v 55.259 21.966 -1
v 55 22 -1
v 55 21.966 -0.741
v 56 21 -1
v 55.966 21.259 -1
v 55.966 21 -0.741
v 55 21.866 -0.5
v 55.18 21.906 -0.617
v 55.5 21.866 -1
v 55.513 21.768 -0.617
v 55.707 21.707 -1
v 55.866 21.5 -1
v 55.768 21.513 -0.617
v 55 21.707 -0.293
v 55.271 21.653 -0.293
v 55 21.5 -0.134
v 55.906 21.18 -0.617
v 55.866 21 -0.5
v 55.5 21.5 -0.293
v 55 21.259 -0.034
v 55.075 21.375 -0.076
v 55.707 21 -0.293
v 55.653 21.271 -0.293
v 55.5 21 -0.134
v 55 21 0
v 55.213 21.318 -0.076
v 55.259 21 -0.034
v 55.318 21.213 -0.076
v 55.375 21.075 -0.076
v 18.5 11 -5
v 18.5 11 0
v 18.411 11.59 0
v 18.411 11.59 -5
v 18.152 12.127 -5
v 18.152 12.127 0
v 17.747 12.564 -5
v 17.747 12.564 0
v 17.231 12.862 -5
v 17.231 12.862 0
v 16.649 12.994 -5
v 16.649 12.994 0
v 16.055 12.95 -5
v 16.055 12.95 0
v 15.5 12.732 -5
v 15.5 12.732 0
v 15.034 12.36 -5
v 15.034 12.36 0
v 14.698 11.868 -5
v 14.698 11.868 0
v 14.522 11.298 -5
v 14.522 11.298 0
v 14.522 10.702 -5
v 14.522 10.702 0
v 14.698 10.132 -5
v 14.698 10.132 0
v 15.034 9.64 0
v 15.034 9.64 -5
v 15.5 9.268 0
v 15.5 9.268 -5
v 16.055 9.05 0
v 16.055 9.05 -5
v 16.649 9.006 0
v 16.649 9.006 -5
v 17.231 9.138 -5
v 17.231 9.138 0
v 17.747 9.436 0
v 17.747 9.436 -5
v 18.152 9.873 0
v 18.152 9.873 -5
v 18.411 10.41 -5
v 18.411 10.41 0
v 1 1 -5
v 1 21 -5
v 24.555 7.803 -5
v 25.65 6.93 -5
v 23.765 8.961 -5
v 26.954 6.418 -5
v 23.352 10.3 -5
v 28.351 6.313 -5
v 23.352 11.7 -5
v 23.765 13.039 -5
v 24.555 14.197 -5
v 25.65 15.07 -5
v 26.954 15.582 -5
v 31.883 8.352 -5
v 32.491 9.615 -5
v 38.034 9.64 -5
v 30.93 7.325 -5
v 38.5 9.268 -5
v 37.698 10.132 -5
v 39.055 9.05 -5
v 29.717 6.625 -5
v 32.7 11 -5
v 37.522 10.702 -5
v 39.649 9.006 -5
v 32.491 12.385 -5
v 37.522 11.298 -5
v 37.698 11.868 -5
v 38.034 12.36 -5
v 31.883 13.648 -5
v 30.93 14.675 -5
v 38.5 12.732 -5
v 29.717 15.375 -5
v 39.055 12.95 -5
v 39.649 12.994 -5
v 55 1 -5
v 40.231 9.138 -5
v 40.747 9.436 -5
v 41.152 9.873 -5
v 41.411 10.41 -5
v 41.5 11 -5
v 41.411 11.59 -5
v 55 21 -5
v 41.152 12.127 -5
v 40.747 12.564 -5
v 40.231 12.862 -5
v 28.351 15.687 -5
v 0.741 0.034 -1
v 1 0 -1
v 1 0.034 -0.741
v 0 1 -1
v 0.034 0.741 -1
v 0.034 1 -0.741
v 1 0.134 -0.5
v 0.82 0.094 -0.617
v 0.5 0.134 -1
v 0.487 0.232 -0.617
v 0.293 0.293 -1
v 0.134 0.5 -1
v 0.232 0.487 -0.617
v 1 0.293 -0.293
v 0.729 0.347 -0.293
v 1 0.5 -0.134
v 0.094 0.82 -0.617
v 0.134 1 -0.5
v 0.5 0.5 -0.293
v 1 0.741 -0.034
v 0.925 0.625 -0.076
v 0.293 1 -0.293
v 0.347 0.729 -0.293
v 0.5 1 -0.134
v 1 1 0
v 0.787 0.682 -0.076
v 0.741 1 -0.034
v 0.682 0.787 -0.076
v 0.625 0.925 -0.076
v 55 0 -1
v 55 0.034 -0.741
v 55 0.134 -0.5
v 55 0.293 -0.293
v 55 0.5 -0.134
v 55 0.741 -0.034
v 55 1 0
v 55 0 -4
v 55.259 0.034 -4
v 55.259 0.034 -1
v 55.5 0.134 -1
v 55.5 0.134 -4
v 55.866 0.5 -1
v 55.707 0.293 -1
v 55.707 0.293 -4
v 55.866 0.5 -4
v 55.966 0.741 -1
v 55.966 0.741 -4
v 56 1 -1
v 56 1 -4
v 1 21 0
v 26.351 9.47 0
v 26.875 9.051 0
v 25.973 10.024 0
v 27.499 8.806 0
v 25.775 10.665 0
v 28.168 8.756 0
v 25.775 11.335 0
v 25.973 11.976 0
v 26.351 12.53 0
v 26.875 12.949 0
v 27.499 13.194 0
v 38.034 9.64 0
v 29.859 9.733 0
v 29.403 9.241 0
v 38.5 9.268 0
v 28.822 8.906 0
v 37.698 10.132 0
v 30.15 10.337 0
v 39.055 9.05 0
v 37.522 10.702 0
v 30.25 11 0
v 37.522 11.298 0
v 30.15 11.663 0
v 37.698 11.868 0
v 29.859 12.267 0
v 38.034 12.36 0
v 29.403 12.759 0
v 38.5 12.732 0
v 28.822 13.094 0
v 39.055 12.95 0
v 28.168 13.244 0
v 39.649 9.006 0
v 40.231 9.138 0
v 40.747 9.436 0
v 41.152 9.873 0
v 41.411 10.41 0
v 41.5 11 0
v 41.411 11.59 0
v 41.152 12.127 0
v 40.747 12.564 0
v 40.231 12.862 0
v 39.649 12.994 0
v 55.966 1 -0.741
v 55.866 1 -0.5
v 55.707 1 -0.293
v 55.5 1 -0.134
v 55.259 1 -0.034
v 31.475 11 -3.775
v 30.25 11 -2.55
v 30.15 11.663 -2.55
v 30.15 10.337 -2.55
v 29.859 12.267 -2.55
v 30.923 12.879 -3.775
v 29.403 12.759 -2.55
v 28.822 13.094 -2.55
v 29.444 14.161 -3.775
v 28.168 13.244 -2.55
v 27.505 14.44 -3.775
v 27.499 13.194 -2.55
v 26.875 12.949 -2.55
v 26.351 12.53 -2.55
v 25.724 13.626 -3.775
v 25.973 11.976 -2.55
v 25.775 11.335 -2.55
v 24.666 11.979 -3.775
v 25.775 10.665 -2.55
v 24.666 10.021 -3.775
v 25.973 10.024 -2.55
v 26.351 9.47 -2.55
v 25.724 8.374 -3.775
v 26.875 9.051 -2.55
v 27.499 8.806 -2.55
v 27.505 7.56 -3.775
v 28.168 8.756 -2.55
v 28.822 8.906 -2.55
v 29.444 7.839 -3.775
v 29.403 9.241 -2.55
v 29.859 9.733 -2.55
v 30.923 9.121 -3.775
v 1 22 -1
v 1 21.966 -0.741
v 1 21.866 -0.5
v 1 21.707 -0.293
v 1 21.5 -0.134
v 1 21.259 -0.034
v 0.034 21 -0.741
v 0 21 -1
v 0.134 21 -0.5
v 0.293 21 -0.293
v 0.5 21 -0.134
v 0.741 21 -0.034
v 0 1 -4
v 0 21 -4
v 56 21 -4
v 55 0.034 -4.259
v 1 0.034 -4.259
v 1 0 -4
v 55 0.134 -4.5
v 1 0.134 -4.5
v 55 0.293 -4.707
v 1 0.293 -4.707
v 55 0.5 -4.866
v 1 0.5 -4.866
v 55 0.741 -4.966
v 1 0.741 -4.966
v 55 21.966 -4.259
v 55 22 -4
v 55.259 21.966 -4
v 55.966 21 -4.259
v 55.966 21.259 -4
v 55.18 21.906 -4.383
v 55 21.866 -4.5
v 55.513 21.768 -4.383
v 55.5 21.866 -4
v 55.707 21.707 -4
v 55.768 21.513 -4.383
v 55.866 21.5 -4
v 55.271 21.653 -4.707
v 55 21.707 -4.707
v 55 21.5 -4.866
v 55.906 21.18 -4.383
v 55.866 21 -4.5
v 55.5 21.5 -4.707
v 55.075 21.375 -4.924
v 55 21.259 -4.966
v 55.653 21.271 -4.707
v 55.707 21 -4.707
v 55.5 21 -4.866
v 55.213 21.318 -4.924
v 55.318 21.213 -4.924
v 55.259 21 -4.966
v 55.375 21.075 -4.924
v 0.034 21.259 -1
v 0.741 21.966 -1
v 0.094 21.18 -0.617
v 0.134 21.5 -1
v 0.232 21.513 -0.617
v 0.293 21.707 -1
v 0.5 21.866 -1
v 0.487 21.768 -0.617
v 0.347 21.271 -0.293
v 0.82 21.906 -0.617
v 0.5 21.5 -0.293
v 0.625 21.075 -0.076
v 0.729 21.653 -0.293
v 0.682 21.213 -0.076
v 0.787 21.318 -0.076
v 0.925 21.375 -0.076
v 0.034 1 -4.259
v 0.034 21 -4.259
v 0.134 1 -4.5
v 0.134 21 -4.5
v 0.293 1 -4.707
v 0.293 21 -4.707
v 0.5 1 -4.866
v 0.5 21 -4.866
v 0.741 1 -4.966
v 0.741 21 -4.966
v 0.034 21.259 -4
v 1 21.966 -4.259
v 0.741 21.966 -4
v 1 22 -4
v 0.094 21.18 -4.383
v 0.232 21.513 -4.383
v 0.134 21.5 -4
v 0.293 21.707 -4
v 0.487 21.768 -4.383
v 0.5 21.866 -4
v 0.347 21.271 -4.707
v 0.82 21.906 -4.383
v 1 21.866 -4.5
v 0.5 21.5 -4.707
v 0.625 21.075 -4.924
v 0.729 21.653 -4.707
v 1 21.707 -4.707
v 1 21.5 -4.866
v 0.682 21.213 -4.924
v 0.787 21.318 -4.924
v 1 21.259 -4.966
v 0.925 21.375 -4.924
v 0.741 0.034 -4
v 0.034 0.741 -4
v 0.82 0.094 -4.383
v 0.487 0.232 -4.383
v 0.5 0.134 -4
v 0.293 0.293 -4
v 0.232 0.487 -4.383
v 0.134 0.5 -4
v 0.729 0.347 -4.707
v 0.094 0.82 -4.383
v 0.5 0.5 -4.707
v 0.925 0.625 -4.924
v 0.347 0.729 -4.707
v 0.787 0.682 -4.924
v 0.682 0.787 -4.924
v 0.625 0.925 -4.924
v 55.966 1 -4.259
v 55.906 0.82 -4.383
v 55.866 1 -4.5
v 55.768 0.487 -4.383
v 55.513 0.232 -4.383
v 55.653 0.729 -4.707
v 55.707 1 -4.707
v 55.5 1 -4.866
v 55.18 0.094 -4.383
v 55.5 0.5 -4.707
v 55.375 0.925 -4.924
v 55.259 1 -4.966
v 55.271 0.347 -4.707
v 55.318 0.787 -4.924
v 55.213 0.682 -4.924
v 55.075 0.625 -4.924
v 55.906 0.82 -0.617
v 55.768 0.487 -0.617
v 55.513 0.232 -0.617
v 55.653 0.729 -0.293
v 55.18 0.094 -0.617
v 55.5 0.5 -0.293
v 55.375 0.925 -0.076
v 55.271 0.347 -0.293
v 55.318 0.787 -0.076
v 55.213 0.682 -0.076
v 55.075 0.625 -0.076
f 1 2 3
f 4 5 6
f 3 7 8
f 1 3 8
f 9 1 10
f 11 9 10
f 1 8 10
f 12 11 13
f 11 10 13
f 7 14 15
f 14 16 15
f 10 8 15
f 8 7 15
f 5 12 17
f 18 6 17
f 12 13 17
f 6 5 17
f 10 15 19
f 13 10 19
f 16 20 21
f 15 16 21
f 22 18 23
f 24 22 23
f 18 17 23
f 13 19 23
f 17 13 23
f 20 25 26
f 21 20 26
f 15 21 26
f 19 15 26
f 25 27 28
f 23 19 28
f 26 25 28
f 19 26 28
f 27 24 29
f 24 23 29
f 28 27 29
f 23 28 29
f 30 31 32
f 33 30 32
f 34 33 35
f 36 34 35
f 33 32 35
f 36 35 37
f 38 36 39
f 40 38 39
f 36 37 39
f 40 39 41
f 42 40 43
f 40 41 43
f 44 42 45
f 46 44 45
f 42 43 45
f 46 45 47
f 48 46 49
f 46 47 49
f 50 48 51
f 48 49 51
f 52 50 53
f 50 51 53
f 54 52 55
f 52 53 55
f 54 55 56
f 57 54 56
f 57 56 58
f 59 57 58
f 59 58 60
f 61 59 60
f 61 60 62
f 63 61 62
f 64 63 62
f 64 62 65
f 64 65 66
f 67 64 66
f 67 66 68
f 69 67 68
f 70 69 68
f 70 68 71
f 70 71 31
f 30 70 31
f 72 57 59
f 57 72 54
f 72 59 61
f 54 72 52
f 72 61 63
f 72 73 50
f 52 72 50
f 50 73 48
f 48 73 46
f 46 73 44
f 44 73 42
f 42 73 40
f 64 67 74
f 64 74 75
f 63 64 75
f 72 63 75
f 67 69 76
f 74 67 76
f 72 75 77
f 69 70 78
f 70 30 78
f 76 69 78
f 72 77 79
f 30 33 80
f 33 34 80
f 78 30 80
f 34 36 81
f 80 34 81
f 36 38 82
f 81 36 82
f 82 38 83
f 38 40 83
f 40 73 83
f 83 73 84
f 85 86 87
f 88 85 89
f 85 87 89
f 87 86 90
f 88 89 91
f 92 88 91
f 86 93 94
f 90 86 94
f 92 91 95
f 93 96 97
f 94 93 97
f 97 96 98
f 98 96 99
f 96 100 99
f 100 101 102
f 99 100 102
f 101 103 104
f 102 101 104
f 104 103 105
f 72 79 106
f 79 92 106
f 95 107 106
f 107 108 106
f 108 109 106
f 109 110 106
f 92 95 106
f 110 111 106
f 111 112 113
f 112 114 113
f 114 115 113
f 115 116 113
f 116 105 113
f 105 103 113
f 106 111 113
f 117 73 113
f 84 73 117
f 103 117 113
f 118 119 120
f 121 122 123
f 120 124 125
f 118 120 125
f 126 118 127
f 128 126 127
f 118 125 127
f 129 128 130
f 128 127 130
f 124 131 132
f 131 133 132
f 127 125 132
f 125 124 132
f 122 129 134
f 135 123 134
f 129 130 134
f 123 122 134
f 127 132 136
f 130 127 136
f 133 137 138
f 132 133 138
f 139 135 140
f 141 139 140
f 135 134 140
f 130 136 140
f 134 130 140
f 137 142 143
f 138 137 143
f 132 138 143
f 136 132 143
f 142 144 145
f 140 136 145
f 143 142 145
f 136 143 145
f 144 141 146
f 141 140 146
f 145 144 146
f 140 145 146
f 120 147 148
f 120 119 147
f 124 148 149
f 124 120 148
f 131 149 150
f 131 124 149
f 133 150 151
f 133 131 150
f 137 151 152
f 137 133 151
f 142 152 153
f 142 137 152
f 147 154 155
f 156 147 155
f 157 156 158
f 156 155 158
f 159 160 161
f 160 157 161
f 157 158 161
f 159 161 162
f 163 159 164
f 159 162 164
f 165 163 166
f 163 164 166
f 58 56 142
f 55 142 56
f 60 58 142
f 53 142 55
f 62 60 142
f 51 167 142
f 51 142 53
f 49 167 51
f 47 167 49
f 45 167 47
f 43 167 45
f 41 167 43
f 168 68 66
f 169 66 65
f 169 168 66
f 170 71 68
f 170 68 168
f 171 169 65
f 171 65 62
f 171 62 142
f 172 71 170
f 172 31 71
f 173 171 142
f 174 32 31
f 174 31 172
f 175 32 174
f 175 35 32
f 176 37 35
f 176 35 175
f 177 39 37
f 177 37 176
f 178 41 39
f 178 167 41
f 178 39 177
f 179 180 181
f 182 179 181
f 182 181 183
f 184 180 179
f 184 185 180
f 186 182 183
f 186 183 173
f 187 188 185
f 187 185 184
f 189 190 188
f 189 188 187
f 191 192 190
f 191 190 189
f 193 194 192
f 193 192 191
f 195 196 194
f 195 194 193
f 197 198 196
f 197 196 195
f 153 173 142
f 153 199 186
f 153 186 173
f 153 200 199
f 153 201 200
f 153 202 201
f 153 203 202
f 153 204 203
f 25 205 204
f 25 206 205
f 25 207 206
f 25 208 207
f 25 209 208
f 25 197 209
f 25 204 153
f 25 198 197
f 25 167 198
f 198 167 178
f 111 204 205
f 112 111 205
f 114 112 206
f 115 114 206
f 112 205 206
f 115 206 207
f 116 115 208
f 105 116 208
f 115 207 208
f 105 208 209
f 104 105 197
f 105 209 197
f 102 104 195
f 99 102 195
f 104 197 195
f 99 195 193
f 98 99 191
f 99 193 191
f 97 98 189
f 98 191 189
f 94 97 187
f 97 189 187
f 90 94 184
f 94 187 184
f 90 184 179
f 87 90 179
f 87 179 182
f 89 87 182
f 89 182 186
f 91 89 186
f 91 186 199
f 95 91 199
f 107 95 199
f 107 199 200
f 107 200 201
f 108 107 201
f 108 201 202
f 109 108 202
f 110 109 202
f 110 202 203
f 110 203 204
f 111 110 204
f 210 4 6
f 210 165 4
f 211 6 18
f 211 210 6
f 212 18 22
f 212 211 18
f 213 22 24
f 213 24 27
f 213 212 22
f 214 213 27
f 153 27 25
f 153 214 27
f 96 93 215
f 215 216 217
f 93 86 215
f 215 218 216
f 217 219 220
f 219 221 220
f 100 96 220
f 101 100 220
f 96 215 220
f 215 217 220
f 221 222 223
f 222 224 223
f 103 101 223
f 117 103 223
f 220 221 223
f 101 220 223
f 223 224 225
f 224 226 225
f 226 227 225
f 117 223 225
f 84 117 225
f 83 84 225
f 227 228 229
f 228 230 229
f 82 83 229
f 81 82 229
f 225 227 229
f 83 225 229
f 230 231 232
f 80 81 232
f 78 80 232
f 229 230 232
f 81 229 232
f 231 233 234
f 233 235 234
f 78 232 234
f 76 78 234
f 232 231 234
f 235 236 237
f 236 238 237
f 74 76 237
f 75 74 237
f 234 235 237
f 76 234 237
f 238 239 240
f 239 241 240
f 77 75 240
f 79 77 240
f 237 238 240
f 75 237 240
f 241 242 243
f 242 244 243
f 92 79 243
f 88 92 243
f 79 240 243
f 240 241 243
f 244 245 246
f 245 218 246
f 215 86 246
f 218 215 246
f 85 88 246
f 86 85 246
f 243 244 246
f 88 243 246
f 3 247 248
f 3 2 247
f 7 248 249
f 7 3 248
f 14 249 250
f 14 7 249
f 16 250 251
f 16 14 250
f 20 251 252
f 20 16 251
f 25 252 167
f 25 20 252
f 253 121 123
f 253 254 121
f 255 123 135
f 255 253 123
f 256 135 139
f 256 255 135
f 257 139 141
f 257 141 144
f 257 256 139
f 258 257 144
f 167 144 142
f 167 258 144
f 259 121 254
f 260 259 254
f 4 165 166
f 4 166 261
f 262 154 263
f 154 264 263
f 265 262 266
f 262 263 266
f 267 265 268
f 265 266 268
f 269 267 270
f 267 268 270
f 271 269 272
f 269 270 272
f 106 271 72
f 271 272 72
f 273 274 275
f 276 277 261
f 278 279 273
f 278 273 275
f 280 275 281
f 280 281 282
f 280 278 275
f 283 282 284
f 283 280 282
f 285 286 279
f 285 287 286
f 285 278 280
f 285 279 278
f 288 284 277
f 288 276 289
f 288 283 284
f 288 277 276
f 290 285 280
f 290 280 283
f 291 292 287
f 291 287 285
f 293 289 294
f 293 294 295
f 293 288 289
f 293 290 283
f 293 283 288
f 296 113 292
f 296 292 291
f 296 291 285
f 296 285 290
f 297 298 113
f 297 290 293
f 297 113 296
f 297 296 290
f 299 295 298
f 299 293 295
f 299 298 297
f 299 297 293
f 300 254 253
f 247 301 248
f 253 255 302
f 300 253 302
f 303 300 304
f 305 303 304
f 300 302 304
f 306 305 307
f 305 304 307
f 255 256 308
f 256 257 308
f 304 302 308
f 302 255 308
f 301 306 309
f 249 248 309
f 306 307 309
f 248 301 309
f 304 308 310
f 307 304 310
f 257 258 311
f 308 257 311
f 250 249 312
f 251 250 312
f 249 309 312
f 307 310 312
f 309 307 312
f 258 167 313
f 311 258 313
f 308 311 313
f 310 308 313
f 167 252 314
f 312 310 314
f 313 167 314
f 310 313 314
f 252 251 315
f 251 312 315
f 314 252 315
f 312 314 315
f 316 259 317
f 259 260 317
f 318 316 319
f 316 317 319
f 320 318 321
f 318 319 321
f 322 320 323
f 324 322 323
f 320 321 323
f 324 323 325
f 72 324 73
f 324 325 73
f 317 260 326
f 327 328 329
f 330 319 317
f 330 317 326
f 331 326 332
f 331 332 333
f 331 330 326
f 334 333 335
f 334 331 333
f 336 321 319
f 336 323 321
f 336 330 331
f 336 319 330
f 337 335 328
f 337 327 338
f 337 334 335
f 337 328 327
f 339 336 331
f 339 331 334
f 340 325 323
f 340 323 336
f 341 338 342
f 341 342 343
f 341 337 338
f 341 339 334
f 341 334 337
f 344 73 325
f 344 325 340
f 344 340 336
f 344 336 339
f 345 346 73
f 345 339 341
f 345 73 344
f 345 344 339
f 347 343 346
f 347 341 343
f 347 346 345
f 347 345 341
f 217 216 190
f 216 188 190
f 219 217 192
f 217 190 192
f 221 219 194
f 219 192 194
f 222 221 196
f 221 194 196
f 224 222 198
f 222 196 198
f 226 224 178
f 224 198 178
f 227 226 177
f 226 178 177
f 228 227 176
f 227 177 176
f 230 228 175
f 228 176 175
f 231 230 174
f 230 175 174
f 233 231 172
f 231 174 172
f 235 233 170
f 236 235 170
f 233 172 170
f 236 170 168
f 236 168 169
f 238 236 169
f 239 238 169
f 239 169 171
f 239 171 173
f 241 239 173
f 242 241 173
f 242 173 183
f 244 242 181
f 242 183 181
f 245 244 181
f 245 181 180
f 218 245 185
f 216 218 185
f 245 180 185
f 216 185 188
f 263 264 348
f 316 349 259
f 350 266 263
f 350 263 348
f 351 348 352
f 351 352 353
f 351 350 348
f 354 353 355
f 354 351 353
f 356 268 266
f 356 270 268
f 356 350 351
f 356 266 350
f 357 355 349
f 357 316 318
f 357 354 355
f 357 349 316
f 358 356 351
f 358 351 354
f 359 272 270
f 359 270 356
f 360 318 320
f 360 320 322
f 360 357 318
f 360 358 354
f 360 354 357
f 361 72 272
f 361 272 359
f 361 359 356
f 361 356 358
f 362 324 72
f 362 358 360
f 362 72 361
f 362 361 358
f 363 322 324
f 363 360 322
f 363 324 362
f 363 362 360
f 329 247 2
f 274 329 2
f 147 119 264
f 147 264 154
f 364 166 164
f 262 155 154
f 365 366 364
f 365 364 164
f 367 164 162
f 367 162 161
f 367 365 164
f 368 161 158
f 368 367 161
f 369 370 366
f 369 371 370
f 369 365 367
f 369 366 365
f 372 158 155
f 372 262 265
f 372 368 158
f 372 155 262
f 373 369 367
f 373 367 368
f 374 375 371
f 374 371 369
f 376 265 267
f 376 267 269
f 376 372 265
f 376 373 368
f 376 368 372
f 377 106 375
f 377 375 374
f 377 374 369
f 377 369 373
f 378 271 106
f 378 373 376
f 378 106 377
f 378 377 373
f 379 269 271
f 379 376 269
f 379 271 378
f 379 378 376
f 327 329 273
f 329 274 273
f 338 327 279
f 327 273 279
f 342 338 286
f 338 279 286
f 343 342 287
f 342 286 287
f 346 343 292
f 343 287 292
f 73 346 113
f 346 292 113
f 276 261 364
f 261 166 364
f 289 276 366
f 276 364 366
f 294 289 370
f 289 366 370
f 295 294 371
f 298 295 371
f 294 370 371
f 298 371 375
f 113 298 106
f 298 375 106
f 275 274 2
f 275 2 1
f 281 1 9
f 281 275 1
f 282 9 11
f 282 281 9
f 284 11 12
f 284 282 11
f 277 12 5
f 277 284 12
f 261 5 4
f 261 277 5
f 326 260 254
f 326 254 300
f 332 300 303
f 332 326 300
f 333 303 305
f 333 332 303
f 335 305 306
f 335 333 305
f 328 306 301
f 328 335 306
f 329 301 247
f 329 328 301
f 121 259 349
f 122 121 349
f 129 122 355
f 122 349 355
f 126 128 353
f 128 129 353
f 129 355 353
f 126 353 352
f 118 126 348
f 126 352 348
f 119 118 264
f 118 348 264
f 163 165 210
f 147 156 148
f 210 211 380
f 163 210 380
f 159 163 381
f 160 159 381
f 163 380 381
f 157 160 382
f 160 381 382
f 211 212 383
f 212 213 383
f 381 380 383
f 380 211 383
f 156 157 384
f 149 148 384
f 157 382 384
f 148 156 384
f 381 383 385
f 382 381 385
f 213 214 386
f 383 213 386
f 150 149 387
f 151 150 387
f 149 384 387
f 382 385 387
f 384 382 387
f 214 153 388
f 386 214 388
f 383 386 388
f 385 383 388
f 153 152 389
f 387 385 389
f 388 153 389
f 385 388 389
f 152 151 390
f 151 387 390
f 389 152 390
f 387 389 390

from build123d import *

# Parameters (mm, degrees)
SKETCH2_W                                       = 56
SKETCH2_H                                       = 22
BOSS_EXTRUDE2_DEPTH                             = 5
SKETCH5_R                                       = 2
MOUNTING_HOLES_DEPTH                            = 61.373835392
SMALL_EDGE_FILLET_R                             = 1
FRONT_BACK_EDGE_FILLET_R                        = 1
CSK_FOR_M4_FLAT_HEAD_MACHINE_SCREW2_D           = 4.5
CSK_FOR_M4_FLAT_HEAD_MACHINE_SCREW2_CSINK_D     = 9.4
CSK_FOR_M4_FLAT_HEAD_MACHINE_SCREW2_CSINK_ANGLE = 90


with BuildPart() as part:
    # Sketch2 → Boss-Extrude2 (new body)
    with BuildSketch(Plane.XY):
        with Locations((28, 11)):
            Rectangle(SKETCH2_W, SKETCH2_H)
    extrude(amount=-BOSS_EXTRUDE2_DEPTH)

    # Sketch5 → Mounting Holes (cut, through all)
    with BuildSketch(Plane.XY):
        with Locations((16.5, 11)):
            Circle(SKETCH5_R)
        with Locations((39.5, 11)):
            Circle(SKETCH5_R)
    extrude(amount=-MOUNTING_HOLES_DEPTH, mode=Mode.SUBTRACT)

    # Small Edge Fillet
    small_edge_fillet_edges = [part.edges().sort_by_distance(p)[0] for p in [
        (0, 22, -2.5),
        (56, 22, -2.5),
        (56, 0, -2.5),
        (0, 0, -2.5),
    ]]
    fillet(small_edge_fillet_edges, radius=SMALL_EDGE_FILLET_R)

    # Front-Back Edge Fillet
    front_back_edge_fillet_edges = [part.edges().sort_by_distance(p)[0] for p in [
        (0, 11, 0),
        (0, 11, -5),
        (28, 0, 0),
        (56, 11, 0),
        (28, 22, 0),
        (0.292893219, 21.707106781, 0),
        (55.707106781, 21.707106781, 0),
        (55.707106781, 0.292893219, 0),
        (0.292893219, 0.292893219, 0),
        (28, 0, -5),
        (28, 22, -5),
        (56, 11, -5),
        (0.292893219, 21.707106781, -5),
        (55.707106781, 21.707106781, -5),
        (55.707106781, 0.292893219, -5),
        (0.292893219, 0.292893219, -5),
    ]]
    fillet(front_back_edge_fillet_edges, radius=FRONT_BACK_EDGE_FILLET_R)

    # CSK for M4 Flat Head Machine Screw2 (through all)
    with Locations(Plane(origin=(0, 0, -5), x_dir=(-1, 0, 0), z_dir=(0, 0, -1))):
        with Locations((-28, 11)):
            CounterSinkHole(CSK_FOR_M4_FLAT_HEAD_MACHINE_SCREW2_D / 2, CSK_FOR_M4_FLAT_HEAD_MACHINE_SCREW2_CSINK_D / 2, counter_sink_angle=CSK_FOR_M4_FLAT_HEAD_MACHINE_SCREW2_CSINK_ANGLE)


solid = part.part
